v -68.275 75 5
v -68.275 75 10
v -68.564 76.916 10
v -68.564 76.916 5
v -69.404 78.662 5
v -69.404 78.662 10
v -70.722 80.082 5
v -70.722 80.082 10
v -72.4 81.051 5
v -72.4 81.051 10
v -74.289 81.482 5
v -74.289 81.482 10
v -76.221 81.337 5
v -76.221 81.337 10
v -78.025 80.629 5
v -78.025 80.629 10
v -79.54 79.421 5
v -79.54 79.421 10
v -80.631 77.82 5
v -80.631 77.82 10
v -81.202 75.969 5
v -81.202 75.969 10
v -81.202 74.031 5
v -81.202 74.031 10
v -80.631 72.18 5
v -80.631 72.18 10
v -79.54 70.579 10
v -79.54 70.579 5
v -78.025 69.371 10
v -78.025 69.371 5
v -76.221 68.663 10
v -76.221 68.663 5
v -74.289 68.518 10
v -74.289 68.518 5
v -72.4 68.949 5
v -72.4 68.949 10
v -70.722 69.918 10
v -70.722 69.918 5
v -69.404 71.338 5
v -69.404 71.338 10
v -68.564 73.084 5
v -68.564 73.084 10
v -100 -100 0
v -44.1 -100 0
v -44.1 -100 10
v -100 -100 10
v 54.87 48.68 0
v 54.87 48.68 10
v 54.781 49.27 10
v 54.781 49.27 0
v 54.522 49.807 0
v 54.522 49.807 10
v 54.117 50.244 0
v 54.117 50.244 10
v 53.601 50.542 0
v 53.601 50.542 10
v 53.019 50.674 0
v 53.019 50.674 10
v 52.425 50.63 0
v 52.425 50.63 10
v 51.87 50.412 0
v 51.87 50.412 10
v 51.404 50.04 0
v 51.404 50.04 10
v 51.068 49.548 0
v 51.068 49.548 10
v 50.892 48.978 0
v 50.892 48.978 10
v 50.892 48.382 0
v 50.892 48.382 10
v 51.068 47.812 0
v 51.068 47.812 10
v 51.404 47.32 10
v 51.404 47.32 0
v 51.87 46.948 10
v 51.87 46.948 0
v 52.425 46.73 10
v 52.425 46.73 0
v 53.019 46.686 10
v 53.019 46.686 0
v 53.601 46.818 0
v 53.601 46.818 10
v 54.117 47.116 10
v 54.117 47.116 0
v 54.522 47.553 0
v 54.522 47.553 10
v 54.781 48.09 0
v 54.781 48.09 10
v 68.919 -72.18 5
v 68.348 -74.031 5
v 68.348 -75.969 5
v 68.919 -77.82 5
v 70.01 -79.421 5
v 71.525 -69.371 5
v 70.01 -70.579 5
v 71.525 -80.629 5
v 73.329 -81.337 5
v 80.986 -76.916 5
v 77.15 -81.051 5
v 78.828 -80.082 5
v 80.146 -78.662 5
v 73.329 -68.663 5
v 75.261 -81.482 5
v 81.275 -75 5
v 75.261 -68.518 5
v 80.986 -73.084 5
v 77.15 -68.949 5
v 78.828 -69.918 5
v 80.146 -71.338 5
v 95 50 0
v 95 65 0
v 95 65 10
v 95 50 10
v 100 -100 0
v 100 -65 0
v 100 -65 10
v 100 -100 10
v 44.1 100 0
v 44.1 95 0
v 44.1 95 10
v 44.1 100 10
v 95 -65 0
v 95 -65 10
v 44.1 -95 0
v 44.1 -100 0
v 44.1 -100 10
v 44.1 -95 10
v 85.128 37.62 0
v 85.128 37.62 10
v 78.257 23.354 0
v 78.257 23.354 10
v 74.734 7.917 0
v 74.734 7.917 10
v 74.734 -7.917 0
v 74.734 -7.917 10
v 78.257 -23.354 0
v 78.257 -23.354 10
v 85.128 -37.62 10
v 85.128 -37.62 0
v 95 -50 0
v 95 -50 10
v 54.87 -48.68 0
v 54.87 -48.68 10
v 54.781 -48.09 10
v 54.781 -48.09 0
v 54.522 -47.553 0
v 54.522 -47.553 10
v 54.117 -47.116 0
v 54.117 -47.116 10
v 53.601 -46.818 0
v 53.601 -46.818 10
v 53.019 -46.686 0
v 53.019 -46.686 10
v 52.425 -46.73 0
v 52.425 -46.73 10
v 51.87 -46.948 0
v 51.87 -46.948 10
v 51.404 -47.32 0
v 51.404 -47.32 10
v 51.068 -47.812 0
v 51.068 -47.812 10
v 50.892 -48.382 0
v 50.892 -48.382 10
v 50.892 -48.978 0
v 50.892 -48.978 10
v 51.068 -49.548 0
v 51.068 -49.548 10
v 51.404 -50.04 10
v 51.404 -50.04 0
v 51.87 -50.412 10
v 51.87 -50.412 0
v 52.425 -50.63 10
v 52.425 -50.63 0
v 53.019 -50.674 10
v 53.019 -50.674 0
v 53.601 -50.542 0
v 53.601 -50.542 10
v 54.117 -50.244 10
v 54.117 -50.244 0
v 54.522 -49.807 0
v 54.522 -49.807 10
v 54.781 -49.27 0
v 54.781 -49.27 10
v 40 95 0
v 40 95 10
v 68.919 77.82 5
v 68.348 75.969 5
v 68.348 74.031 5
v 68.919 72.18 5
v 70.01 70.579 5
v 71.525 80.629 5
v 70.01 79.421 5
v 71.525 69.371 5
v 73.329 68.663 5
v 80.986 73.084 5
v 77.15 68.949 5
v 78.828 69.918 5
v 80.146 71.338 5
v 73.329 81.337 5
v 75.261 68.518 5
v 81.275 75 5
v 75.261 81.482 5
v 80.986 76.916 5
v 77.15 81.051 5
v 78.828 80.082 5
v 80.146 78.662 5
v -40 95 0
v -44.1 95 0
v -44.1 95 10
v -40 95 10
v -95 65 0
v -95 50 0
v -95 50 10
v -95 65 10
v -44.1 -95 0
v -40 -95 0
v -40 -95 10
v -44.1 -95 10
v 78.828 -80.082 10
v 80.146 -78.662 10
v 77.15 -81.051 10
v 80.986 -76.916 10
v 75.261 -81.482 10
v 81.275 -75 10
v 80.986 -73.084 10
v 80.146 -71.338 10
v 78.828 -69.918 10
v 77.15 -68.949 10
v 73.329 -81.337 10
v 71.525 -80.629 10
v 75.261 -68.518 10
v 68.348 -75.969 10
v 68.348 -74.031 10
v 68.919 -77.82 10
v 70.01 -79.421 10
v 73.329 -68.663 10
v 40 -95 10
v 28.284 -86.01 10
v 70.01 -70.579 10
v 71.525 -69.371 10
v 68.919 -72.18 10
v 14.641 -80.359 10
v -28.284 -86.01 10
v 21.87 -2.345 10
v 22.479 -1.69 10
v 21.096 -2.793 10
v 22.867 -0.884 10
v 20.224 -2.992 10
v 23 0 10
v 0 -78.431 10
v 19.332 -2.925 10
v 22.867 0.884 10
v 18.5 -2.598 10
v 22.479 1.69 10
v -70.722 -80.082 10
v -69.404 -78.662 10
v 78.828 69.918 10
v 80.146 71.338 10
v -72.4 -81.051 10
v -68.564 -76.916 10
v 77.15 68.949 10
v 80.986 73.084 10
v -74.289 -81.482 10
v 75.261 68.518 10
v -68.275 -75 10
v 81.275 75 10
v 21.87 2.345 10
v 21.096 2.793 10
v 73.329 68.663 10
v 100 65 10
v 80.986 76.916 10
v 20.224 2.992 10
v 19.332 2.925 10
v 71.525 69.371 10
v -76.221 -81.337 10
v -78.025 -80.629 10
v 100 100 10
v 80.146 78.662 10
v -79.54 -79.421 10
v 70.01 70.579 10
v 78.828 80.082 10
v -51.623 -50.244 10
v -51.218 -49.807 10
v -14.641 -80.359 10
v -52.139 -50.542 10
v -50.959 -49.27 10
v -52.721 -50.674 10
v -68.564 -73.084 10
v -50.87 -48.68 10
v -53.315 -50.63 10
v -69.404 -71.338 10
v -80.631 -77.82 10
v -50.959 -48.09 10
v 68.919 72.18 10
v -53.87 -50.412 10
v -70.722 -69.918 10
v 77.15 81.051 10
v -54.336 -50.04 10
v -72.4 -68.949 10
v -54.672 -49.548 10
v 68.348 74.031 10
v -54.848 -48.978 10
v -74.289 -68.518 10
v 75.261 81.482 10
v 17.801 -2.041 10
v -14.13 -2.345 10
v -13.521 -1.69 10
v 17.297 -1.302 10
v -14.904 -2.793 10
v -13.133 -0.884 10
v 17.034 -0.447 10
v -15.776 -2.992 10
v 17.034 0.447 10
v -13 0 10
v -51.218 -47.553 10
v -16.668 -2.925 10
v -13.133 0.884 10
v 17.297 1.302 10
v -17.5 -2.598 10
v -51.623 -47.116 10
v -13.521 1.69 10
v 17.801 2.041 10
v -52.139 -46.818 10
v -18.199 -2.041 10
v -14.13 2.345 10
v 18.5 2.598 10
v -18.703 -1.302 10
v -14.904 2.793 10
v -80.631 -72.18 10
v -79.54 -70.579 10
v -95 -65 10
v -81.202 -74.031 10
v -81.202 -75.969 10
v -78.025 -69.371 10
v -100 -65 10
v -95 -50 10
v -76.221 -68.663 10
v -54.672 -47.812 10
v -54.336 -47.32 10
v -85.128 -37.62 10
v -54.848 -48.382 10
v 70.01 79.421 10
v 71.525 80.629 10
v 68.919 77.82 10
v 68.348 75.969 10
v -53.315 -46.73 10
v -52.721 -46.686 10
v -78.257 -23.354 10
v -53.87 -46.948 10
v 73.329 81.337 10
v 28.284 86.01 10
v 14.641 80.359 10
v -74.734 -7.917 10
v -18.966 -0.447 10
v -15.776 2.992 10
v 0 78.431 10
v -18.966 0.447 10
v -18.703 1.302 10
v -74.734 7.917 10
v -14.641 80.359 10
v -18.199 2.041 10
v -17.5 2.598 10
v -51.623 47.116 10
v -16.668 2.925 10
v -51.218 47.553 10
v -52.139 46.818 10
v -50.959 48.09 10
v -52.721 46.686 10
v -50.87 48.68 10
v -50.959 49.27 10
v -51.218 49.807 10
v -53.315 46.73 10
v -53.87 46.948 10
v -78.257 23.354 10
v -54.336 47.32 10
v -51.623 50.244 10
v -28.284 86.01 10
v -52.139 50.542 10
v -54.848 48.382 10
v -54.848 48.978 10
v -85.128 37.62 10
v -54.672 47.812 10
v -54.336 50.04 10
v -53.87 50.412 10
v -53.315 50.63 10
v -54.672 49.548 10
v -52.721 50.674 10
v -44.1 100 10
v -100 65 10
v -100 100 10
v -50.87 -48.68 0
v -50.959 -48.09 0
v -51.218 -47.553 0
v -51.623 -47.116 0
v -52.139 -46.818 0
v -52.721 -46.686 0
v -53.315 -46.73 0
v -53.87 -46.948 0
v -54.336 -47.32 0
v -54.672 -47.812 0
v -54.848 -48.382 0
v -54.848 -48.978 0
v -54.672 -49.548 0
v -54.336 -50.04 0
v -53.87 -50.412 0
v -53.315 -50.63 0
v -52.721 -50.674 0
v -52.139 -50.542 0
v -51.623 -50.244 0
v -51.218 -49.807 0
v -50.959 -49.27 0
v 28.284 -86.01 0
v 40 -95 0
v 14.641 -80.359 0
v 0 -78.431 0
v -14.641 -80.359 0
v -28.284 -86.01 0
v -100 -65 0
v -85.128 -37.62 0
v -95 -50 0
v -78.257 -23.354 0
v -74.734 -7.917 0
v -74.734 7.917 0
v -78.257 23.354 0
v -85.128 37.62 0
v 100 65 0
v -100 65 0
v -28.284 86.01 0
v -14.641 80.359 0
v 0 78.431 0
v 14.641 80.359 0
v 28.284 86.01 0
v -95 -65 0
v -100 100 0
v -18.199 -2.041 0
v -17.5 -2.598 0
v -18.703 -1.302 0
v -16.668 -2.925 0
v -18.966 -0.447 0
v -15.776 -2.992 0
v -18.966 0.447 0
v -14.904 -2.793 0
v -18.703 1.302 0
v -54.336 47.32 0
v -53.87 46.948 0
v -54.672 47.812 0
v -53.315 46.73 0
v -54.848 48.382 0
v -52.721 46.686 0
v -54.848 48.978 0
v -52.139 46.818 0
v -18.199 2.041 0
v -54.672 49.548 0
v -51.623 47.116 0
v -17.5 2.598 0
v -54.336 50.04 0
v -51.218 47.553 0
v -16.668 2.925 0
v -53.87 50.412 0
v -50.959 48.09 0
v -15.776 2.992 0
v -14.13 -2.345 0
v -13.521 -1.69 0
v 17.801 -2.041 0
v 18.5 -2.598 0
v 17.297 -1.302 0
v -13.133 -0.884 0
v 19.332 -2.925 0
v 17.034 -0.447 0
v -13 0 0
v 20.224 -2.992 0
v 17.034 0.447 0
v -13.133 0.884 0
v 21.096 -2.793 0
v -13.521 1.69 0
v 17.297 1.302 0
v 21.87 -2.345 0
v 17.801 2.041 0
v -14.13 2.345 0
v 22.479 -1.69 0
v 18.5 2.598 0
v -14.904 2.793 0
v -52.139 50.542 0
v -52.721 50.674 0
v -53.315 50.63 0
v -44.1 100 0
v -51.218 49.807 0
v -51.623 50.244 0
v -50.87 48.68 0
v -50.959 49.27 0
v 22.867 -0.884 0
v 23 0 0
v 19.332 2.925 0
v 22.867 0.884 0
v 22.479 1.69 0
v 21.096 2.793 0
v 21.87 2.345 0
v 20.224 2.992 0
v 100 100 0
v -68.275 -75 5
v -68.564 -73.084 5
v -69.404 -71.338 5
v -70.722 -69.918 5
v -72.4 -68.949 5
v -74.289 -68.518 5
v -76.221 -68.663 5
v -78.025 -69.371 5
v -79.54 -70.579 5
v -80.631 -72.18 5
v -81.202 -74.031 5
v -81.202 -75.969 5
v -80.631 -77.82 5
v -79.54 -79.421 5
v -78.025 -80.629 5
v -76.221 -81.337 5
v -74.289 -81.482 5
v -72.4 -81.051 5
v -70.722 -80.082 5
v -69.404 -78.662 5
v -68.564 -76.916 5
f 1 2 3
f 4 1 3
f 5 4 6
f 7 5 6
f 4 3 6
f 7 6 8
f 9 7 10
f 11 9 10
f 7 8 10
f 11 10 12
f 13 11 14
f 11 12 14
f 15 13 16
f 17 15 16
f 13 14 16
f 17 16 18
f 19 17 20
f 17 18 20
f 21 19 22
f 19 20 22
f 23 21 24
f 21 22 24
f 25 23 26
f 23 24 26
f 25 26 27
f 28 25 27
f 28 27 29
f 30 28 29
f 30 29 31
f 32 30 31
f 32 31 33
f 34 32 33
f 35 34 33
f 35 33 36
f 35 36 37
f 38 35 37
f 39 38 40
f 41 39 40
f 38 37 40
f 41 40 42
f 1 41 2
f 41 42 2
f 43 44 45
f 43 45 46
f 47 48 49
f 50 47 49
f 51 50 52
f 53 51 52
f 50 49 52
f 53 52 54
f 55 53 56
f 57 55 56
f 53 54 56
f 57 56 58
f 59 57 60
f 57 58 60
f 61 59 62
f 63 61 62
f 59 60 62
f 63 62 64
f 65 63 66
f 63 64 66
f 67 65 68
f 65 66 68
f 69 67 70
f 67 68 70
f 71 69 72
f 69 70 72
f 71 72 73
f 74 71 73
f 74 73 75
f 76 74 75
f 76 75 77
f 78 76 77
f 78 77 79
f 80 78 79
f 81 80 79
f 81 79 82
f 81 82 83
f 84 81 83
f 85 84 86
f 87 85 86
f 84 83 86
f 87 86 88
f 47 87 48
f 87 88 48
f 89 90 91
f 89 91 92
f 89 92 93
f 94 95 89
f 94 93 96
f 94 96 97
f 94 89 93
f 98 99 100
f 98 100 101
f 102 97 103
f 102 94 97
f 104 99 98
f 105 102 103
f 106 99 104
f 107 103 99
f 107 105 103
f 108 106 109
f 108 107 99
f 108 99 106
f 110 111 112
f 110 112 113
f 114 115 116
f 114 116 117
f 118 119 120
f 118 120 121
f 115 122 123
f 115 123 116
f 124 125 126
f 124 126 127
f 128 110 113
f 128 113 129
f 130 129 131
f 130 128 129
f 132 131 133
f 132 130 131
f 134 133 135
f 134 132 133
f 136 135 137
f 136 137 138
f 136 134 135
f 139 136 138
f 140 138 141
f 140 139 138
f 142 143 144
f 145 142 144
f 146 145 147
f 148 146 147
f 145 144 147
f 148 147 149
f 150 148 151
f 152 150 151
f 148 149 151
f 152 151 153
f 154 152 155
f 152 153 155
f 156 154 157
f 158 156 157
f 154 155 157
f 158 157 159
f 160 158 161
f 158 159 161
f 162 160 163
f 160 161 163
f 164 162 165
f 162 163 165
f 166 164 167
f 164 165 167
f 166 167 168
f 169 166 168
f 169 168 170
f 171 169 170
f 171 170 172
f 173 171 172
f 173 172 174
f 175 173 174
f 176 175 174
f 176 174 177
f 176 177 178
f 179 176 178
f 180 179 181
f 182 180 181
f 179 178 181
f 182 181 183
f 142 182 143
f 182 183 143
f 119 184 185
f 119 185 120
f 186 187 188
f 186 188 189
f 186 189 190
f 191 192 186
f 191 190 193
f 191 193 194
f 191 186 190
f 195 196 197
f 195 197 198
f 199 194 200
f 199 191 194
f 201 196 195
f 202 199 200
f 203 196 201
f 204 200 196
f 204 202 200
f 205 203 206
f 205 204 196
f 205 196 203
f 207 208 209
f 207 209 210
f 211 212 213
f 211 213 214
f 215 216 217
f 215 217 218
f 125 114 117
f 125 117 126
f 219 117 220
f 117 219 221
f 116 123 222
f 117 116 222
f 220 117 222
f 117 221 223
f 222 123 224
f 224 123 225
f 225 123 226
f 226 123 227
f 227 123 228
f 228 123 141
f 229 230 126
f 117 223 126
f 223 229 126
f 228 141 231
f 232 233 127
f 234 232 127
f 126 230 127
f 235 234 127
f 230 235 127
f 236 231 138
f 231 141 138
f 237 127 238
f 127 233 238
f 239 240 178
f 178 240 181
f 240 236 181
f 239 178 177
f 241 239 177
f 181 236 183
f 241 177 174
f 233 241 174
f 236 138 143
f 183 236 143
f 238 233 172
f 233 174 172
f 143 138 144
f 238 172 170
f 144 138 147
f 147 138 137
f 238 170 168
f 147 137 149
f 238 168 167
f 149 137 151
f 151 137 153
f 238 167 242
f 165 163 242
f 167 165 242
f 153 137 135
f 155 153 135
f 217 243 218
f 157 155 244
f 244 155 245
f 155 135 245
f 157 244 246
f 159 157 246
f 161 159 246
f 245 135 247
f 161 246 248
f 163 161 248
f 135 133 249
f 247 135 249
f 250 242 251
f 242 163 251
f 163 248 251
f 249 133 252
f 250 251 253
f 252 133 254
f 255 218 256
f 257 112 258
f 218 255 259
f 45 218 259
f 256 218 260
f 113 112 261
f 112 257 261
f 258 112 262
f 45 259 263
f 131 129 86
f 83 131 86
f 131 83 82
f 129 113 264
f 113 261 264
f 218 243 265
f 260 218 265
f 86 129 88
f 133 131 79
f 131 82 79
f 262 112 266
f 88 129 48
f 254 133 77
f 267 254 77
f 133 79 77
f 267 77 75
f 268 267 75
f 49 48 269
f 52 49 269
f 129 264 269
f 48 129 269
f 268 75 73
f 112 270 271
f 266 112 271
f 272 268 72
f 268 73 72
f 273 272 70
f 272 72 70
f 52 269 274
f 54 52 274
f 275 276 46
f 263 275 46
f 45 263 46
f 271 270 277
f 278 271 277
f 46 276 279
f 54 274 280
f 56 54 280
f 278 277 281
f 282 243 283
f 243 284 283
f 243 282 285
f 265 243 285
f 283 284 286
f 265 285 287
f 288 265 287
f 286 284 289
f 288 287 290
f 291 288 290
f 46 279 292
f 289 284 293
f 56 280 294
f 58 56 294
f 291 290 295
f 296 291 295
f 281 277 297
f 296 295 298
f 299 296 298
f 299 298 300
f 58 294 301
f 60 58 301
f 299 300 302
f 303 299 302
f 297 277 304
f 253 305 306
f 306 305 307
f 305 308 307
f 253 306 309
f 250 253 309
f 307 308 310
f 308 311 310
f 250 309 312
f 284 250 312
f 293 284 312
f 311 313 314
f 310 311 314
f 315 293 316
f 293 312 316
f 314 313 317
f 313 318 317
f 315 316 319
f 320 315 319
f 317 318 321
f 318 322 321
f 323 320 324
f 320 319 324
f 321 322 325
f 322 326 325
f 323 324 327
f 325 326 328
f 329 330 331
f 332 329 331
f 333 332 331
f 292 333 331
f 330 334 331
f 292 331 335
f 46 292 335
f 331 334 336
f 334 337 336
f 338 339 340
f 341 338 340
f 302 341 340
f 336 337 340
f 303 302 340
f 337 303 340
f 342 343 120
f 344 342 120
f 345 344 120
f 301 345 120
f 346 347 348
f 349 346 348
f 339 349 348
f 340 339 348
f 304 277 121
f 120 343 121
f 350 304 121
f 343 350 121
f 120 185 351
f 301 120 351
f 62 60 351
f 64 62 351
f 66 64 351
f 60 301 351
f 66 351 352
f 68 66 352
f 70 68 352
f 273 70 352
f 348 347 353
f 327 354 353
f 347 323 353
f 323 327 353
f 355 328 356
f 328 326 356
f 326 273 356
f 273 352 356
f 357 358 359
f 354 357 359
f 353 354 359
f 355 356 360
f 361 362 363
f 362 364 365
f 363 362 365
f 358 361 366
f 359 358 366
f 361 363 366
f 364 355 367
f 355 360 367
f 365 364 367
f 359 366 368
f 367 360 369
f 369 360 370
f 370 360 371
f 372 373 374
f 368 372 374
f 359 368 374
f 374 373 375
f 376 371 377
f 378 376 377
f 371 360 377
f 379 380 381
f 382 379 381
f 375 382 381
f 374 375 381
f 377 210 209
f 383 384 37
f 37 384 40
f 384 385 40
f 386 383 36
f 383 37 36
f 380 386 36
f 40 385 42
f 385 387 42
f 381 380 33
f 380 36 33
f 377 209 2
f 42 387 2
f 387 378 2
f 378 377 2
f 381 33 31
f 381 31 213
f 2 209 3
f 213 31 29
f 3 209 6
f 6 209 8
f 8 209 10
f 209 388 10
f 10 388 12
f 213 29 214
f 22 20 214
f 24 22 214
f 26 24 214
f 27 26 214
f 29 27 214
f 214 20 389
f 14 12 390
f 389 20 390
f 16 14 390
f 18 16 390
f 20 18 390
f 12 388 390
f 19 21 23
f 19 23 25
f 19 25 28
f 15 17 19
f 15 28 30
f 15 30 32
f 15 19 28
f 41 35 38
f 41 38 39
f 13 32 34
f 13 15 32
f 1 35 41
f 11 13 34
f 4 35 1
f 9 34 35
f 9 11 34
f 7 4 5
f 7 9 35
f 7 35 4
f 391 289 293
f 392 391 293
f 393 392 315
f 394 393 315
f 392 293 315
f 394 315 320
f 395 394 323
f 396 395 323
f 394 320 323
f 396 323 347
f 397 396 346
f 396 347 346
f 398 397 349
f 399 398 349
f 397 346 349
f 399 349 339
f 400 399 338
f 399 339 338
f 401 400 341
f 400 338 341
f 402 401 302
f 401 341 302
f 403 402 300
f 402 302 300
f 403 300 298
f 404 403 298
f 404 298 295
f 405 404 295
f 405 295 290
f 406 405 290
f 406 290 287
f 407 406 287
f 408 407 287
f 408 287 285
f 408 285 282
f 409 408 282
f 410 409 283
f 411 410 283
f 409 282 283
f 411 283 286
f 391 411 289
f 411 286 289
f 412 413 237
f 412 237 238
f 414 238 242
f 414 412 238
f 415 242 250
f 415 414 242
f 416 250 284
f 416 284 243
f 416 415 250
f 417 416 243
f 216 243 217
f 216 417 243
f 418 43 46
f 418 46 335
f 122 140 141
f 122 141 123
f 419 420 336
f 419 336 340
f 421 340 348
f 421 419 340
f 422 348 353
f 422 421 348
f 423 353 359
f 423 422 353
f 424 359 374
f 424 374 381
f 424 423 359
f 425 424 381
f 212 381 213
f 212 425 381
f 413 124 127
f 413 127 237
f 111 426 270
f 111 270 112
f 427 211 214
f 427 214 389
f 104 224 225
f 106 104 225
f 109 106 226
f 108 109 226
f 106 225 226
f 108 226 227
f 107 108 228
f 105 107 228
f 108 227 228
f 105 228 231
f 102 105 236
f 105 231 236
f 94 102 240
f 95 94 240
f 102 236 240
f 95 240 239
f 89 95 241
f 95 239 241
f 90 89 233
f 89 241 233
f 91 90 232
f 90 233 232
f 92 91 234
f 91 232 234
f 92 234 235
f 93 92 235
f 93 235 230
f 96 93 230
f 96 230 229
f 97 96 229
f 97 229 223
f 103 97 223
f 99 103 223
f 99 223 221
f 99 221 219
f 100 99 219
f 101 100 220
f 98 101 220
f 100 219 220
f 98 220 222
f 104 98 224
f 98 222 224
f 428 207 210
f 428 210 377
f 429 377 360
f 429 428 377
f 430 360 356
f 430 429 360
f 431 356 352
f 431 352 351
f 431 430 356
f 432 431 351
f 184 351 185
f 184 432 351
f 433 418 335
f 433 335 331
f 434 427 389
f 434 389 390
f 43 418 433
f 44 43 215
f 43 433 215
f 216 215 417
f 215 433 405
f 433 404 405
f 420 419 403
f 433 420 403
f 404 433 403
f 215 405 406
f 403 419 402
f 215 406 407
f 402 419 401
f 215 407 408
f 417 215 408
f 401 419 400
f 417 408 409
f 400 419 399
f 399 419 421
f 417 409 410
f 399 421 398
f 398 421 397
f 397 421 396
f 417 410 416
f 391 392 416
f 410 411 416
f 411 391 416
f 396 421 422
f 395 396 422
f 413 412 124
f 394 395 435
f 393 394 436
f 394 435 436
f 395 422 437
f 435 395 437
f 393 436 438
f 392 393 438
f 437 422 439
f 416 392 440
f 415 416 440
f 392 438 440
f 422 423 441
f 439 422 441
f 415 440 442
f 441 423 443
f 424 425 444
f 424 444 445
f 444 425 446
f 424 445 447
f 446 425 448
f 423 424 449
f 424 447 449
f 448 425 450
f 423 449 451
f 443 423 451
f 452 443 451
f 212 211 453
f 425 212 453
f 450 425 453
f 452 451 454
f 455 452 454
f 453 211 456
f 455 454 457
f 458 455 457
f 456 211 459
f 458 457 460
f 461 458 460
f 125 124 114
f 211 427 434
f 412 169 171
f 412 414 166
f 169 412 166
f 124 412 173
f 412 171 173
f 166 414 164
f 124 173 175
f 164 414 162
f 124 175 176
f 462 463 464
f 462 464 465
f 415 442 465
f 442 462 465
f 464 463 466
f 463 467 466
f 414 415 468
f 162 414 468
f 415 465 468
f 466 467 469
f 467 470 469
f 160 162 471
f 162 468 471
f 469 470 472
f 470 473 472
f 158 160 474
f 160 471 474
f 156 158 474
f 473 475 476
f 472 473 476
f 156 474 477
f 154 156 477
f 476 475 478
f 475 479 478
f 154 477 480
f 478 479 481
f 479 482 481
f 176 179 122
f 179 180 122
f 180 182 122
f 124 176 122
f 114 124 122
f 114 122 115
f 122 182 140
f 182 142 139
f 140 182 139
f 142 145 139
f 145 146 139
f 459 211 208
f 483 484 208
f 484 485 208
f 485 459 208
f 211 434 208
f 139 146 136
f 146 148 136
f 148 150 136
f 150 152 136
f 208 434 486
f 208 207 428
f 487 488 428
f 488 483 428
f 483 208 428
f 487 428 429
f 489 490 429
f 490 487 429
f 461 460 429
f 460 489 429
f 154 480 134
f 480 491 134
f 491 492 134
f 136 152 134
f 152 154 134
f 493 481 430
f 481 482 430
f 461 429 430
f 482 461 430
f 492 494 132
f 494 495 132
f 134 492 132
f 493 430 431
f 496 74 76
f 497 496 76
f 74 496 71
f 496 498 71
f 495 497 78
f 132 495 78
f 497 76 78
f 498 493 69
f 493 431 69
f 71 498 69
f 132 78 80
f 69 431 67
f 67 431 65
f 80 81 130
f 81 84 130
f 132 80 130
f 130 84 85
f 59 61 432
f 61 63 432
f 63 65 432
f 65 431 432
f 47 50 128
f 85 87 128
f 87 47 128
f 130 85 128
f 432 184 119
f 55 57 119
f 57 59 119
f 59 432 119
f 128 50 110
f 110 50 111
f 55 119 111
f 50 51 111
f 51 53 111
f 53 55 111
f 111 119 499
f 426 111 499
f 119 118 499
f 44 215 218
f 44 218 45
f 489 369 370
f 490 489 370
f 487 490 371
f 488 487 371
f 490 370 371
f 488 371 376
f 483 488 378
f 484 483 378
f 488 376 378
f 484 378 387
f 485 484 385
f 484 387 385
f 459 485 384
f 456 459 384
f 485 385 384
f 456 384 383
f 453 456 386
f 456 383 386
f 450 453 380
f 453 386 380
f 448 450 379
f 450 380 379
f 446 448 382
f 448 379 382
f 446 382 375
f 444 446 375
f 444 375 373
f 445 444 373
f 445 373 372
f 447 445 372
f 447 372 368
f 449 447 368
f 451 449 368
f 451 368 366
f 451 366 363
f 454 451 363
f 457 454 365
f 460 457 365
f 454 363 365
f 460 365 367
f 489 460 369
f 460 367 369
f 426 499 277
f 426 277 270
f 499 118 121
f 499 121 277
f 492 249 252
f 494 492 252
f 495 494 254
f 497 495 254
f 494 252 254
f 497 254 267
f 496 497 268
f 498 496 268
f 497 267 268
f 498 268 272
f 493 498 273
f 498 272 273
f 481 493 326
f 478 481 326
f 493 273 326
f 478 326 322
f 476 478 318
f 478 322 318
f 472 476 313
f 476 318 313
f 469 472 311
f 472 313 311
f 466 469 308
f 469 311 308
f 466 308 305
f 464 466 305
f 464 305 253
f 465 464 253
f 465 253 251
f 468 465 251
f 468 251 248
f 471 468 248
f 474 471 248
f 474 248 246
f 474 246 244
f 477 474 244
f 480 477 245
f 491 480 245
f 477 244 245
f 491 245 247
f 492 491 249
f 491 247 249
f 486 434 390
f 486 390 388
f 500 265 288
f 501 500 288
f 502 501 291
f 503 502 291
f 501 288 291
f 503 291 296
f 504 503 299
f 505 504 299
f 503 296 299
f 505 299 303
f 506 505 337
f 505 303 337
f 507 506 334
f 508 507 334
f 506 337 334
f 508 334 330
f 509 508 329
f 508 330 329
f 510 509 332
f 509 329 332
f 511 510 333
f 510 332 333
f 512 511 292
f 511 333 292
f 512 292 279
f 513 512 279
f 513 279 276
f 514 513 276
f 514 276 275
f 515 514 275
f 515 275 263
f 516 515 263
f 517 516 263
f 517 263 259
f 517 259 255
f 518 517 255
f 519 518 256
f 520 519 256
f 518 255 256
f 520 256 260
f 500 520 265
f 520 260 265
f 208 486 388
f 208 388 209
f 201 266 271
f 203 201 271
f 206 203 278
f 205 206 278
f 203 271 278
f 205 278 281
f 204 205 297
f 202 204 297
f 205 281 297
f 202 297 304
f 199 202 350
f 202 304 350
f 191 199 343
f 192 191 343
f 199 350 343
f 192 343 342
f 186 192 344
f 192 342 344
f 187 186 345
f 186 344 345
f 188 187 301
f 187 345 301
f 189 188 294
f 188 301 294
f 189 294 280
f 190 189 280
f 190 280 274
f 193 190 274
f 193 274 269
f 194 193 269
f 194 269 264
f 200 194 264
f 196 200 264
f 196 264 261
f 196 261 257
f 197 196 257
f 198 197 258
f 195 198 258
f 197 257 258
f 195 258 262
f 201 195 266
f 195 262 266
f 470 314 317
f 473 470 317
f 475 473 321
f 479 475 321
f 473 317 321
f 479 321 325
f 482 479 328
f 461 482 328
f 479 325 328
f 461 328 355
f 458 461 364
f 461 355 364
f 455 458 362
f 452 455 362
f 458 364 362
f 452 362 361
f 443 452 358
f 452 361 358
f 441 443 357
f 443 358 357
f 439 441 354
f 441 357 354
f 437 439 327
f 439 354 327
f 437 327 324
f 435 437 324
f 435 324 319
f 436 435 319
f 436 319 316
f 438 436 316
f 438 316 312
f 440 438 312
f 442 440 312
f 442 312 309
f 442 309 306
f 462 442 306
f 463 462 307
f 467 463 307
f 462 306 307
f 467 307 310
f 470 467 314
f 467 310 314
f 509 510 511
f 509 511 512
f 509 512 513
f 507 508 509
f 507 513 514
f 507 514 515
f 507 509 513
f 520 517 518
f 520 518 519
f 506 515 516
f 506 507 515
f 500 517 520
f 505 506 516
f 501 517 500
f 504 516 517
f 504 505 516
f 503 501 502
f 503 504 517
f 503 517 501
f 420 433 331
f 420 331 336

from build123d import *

# Parameters (mm, degrees)
SKETCH1_R           = 1.5
BOSS_EXTRUDE1_DEPTH = 10
SKETCH2_R           = 2
CUT_EXTRUDE1_DEPTH  = 10
BOSS_EXTRUDE2_START = -10
SKETCH3_R           = 1.5
BOSS_EXTRUDE2_DEPTH = 10
BOSS_EXTRUDE3_START = -10
SKETCH5_R           = 1.5
BOSS_EXTRUDE3_DEPTH = 10
SKETCH6_R           = 6.5
CUT_EXTRUDE3_DEPTH  = 5
SKETCH8_R           = 3
CUT_EXTRUDE4_DEPTH  = 10


with BuildPart() as part:
    # Sketch1 → Boss-Extrude1 (new body)
    with BuildSketch(Plane.XY):
        with BuildLine():
            ThreePointArc((-40, 95), (0, 78.431457505), (40, 95))
            Line((40, 95), (44.1, 95))
            Line((44.1, 95), (44.1, 100))
            Line((44.1, 100), (100, 100))
            Line((100, 100), (100, 65))
            Line((100, 65), (95, 65))
            Line((95, 65), (95, 50))
            ThreePointArc((95, 50), (74.289321881, 0), (95, -50))
            Line((95, -50), (95, -65))
            Line((95, -65), (100, -65))
            Line((100, -65), (100, -100))
            Line((100, -100), (44.1, -100))
            Line((44.1, -100), (44.1, -95))
            Line((44.1, -95), (40, -95))
            ThreePointArc((40, -95), (0, -78.431457505), (-40, -95))
            Line((-40, -95), (-44.1, -95))
            Line((-44.1, -95), (-44.1, -100))
            Line((-44.1, -100), (-100, -100))
            Line((-100, -100), (-100, -65))
            Line((-100, -65), (-95, -65))
            Line((-95, -65), (-95, -50))
            ThreePointArc((-95, -50), (-74.289321881, 0), (-95, 50))
            Line((-95, 50), (-95, 65))
            Line((-95, 65), (-100, 65))
            Line((-100, 65), (-100, 100))
            Line((-100, 100), (-44.1, 100))
            Line((-44.1, 100), (-44.1, 95))
            Line((-44.1, 95), (-40, 95))
        make_face()
        with Locations((74.775, -75)):
            Circle(SKETCH1_R, mode=Mode.SUBTRACT)
        with Locations((-74.775, -75)):
            Circle(SKETCH1_R, mode=Mode.SUBTRACT)
        with Locations((-74.775, 75)):
            Circle(SKETCH1_R, mode=Mode.SUBTRACT)
        with Locations((74.775, 75)):
            Circle(SKETCH1_R, mode=Mode.SUBTRACT)
    extrude(amount=BOSS_EXTRUDE1_DEPTH)

    # Sketch2 → Cut-Extrude1 (cut)
    with BuildSketch(Plane.XY.offset(10)):
        with Locations((52.87, -48.68)):
            Circle(SKETCH2_R)
        with Locations((-52.87, -48.68)):
            Circle(SKETCH2_R)
        with Locations((52.87, 48.68)):
            Circle(SKETCH2_R)
        with Locations((-52.87, 48.68)):
            Circle(SKETCH2_R)
    extrude(amount=-CUT_EXTRUDE1_DEPTH, mode=Mode.SUBTRACT)

    # Sketch3 → Boss-Extrude2 (add)
    with BuildSketch(Plane.XY.offset(10).offset(BOSS_EXTRUDE2_START)):
        with Locations((74.775, -75)):
            Circle(SKETCH3_R)
    extrude(amount=BOSS_EXTRUDE2_DEPTH)

    # Sketch5 → Boss-Extrude3 (add)
    with BuildSketch(Plane.XY.offset(10).offset(BOSS_EXTRUDE3_START)):
        with Locations((-74.775, -75)):
            Circle(SKETCH5_R)
        with Locations((-74.775, 75)):
            Circle(SKETCH5_R)
        with Locations((74.775, 75)):
            Circle(SKETCH5_R)
    extrude(amount=BOSS_EXTRUDE3_DEPTH)

    # Sketch6 → Cut-Extrude3 (cut)
    with BuildSketch(Plane.XY.offset(10)):
        with Locations((-74.775, 75)):
            Circle(SKETCH6_R)
        with Locations((74.775, 75)):
            Circle(SKETCH6_R)
        with Locations((74.775, -75)):
            Circle(SKETCH6_R)
        with Locations((-74.775, -75)):
            Circle(SKETCH6_R)
    extrude(amount=-CUT_EXTRUDE3_DEPTH, mode=Mode.SUBTRACT)

    # Sketch8 → Cut-Extrude4 (cut)
    with BuildSketch(Plane.XY.offset(10)):
        with Locations((20, 0)):
            Circle(SKETCH8_R)
        with Locations((-16, 0)):
            Circle(SKETCH8_R)
    extrude(amount=-CUT_EXTRUDE4_DEPTH, mode=Mode.SUBTRACT)


solid = part.part
